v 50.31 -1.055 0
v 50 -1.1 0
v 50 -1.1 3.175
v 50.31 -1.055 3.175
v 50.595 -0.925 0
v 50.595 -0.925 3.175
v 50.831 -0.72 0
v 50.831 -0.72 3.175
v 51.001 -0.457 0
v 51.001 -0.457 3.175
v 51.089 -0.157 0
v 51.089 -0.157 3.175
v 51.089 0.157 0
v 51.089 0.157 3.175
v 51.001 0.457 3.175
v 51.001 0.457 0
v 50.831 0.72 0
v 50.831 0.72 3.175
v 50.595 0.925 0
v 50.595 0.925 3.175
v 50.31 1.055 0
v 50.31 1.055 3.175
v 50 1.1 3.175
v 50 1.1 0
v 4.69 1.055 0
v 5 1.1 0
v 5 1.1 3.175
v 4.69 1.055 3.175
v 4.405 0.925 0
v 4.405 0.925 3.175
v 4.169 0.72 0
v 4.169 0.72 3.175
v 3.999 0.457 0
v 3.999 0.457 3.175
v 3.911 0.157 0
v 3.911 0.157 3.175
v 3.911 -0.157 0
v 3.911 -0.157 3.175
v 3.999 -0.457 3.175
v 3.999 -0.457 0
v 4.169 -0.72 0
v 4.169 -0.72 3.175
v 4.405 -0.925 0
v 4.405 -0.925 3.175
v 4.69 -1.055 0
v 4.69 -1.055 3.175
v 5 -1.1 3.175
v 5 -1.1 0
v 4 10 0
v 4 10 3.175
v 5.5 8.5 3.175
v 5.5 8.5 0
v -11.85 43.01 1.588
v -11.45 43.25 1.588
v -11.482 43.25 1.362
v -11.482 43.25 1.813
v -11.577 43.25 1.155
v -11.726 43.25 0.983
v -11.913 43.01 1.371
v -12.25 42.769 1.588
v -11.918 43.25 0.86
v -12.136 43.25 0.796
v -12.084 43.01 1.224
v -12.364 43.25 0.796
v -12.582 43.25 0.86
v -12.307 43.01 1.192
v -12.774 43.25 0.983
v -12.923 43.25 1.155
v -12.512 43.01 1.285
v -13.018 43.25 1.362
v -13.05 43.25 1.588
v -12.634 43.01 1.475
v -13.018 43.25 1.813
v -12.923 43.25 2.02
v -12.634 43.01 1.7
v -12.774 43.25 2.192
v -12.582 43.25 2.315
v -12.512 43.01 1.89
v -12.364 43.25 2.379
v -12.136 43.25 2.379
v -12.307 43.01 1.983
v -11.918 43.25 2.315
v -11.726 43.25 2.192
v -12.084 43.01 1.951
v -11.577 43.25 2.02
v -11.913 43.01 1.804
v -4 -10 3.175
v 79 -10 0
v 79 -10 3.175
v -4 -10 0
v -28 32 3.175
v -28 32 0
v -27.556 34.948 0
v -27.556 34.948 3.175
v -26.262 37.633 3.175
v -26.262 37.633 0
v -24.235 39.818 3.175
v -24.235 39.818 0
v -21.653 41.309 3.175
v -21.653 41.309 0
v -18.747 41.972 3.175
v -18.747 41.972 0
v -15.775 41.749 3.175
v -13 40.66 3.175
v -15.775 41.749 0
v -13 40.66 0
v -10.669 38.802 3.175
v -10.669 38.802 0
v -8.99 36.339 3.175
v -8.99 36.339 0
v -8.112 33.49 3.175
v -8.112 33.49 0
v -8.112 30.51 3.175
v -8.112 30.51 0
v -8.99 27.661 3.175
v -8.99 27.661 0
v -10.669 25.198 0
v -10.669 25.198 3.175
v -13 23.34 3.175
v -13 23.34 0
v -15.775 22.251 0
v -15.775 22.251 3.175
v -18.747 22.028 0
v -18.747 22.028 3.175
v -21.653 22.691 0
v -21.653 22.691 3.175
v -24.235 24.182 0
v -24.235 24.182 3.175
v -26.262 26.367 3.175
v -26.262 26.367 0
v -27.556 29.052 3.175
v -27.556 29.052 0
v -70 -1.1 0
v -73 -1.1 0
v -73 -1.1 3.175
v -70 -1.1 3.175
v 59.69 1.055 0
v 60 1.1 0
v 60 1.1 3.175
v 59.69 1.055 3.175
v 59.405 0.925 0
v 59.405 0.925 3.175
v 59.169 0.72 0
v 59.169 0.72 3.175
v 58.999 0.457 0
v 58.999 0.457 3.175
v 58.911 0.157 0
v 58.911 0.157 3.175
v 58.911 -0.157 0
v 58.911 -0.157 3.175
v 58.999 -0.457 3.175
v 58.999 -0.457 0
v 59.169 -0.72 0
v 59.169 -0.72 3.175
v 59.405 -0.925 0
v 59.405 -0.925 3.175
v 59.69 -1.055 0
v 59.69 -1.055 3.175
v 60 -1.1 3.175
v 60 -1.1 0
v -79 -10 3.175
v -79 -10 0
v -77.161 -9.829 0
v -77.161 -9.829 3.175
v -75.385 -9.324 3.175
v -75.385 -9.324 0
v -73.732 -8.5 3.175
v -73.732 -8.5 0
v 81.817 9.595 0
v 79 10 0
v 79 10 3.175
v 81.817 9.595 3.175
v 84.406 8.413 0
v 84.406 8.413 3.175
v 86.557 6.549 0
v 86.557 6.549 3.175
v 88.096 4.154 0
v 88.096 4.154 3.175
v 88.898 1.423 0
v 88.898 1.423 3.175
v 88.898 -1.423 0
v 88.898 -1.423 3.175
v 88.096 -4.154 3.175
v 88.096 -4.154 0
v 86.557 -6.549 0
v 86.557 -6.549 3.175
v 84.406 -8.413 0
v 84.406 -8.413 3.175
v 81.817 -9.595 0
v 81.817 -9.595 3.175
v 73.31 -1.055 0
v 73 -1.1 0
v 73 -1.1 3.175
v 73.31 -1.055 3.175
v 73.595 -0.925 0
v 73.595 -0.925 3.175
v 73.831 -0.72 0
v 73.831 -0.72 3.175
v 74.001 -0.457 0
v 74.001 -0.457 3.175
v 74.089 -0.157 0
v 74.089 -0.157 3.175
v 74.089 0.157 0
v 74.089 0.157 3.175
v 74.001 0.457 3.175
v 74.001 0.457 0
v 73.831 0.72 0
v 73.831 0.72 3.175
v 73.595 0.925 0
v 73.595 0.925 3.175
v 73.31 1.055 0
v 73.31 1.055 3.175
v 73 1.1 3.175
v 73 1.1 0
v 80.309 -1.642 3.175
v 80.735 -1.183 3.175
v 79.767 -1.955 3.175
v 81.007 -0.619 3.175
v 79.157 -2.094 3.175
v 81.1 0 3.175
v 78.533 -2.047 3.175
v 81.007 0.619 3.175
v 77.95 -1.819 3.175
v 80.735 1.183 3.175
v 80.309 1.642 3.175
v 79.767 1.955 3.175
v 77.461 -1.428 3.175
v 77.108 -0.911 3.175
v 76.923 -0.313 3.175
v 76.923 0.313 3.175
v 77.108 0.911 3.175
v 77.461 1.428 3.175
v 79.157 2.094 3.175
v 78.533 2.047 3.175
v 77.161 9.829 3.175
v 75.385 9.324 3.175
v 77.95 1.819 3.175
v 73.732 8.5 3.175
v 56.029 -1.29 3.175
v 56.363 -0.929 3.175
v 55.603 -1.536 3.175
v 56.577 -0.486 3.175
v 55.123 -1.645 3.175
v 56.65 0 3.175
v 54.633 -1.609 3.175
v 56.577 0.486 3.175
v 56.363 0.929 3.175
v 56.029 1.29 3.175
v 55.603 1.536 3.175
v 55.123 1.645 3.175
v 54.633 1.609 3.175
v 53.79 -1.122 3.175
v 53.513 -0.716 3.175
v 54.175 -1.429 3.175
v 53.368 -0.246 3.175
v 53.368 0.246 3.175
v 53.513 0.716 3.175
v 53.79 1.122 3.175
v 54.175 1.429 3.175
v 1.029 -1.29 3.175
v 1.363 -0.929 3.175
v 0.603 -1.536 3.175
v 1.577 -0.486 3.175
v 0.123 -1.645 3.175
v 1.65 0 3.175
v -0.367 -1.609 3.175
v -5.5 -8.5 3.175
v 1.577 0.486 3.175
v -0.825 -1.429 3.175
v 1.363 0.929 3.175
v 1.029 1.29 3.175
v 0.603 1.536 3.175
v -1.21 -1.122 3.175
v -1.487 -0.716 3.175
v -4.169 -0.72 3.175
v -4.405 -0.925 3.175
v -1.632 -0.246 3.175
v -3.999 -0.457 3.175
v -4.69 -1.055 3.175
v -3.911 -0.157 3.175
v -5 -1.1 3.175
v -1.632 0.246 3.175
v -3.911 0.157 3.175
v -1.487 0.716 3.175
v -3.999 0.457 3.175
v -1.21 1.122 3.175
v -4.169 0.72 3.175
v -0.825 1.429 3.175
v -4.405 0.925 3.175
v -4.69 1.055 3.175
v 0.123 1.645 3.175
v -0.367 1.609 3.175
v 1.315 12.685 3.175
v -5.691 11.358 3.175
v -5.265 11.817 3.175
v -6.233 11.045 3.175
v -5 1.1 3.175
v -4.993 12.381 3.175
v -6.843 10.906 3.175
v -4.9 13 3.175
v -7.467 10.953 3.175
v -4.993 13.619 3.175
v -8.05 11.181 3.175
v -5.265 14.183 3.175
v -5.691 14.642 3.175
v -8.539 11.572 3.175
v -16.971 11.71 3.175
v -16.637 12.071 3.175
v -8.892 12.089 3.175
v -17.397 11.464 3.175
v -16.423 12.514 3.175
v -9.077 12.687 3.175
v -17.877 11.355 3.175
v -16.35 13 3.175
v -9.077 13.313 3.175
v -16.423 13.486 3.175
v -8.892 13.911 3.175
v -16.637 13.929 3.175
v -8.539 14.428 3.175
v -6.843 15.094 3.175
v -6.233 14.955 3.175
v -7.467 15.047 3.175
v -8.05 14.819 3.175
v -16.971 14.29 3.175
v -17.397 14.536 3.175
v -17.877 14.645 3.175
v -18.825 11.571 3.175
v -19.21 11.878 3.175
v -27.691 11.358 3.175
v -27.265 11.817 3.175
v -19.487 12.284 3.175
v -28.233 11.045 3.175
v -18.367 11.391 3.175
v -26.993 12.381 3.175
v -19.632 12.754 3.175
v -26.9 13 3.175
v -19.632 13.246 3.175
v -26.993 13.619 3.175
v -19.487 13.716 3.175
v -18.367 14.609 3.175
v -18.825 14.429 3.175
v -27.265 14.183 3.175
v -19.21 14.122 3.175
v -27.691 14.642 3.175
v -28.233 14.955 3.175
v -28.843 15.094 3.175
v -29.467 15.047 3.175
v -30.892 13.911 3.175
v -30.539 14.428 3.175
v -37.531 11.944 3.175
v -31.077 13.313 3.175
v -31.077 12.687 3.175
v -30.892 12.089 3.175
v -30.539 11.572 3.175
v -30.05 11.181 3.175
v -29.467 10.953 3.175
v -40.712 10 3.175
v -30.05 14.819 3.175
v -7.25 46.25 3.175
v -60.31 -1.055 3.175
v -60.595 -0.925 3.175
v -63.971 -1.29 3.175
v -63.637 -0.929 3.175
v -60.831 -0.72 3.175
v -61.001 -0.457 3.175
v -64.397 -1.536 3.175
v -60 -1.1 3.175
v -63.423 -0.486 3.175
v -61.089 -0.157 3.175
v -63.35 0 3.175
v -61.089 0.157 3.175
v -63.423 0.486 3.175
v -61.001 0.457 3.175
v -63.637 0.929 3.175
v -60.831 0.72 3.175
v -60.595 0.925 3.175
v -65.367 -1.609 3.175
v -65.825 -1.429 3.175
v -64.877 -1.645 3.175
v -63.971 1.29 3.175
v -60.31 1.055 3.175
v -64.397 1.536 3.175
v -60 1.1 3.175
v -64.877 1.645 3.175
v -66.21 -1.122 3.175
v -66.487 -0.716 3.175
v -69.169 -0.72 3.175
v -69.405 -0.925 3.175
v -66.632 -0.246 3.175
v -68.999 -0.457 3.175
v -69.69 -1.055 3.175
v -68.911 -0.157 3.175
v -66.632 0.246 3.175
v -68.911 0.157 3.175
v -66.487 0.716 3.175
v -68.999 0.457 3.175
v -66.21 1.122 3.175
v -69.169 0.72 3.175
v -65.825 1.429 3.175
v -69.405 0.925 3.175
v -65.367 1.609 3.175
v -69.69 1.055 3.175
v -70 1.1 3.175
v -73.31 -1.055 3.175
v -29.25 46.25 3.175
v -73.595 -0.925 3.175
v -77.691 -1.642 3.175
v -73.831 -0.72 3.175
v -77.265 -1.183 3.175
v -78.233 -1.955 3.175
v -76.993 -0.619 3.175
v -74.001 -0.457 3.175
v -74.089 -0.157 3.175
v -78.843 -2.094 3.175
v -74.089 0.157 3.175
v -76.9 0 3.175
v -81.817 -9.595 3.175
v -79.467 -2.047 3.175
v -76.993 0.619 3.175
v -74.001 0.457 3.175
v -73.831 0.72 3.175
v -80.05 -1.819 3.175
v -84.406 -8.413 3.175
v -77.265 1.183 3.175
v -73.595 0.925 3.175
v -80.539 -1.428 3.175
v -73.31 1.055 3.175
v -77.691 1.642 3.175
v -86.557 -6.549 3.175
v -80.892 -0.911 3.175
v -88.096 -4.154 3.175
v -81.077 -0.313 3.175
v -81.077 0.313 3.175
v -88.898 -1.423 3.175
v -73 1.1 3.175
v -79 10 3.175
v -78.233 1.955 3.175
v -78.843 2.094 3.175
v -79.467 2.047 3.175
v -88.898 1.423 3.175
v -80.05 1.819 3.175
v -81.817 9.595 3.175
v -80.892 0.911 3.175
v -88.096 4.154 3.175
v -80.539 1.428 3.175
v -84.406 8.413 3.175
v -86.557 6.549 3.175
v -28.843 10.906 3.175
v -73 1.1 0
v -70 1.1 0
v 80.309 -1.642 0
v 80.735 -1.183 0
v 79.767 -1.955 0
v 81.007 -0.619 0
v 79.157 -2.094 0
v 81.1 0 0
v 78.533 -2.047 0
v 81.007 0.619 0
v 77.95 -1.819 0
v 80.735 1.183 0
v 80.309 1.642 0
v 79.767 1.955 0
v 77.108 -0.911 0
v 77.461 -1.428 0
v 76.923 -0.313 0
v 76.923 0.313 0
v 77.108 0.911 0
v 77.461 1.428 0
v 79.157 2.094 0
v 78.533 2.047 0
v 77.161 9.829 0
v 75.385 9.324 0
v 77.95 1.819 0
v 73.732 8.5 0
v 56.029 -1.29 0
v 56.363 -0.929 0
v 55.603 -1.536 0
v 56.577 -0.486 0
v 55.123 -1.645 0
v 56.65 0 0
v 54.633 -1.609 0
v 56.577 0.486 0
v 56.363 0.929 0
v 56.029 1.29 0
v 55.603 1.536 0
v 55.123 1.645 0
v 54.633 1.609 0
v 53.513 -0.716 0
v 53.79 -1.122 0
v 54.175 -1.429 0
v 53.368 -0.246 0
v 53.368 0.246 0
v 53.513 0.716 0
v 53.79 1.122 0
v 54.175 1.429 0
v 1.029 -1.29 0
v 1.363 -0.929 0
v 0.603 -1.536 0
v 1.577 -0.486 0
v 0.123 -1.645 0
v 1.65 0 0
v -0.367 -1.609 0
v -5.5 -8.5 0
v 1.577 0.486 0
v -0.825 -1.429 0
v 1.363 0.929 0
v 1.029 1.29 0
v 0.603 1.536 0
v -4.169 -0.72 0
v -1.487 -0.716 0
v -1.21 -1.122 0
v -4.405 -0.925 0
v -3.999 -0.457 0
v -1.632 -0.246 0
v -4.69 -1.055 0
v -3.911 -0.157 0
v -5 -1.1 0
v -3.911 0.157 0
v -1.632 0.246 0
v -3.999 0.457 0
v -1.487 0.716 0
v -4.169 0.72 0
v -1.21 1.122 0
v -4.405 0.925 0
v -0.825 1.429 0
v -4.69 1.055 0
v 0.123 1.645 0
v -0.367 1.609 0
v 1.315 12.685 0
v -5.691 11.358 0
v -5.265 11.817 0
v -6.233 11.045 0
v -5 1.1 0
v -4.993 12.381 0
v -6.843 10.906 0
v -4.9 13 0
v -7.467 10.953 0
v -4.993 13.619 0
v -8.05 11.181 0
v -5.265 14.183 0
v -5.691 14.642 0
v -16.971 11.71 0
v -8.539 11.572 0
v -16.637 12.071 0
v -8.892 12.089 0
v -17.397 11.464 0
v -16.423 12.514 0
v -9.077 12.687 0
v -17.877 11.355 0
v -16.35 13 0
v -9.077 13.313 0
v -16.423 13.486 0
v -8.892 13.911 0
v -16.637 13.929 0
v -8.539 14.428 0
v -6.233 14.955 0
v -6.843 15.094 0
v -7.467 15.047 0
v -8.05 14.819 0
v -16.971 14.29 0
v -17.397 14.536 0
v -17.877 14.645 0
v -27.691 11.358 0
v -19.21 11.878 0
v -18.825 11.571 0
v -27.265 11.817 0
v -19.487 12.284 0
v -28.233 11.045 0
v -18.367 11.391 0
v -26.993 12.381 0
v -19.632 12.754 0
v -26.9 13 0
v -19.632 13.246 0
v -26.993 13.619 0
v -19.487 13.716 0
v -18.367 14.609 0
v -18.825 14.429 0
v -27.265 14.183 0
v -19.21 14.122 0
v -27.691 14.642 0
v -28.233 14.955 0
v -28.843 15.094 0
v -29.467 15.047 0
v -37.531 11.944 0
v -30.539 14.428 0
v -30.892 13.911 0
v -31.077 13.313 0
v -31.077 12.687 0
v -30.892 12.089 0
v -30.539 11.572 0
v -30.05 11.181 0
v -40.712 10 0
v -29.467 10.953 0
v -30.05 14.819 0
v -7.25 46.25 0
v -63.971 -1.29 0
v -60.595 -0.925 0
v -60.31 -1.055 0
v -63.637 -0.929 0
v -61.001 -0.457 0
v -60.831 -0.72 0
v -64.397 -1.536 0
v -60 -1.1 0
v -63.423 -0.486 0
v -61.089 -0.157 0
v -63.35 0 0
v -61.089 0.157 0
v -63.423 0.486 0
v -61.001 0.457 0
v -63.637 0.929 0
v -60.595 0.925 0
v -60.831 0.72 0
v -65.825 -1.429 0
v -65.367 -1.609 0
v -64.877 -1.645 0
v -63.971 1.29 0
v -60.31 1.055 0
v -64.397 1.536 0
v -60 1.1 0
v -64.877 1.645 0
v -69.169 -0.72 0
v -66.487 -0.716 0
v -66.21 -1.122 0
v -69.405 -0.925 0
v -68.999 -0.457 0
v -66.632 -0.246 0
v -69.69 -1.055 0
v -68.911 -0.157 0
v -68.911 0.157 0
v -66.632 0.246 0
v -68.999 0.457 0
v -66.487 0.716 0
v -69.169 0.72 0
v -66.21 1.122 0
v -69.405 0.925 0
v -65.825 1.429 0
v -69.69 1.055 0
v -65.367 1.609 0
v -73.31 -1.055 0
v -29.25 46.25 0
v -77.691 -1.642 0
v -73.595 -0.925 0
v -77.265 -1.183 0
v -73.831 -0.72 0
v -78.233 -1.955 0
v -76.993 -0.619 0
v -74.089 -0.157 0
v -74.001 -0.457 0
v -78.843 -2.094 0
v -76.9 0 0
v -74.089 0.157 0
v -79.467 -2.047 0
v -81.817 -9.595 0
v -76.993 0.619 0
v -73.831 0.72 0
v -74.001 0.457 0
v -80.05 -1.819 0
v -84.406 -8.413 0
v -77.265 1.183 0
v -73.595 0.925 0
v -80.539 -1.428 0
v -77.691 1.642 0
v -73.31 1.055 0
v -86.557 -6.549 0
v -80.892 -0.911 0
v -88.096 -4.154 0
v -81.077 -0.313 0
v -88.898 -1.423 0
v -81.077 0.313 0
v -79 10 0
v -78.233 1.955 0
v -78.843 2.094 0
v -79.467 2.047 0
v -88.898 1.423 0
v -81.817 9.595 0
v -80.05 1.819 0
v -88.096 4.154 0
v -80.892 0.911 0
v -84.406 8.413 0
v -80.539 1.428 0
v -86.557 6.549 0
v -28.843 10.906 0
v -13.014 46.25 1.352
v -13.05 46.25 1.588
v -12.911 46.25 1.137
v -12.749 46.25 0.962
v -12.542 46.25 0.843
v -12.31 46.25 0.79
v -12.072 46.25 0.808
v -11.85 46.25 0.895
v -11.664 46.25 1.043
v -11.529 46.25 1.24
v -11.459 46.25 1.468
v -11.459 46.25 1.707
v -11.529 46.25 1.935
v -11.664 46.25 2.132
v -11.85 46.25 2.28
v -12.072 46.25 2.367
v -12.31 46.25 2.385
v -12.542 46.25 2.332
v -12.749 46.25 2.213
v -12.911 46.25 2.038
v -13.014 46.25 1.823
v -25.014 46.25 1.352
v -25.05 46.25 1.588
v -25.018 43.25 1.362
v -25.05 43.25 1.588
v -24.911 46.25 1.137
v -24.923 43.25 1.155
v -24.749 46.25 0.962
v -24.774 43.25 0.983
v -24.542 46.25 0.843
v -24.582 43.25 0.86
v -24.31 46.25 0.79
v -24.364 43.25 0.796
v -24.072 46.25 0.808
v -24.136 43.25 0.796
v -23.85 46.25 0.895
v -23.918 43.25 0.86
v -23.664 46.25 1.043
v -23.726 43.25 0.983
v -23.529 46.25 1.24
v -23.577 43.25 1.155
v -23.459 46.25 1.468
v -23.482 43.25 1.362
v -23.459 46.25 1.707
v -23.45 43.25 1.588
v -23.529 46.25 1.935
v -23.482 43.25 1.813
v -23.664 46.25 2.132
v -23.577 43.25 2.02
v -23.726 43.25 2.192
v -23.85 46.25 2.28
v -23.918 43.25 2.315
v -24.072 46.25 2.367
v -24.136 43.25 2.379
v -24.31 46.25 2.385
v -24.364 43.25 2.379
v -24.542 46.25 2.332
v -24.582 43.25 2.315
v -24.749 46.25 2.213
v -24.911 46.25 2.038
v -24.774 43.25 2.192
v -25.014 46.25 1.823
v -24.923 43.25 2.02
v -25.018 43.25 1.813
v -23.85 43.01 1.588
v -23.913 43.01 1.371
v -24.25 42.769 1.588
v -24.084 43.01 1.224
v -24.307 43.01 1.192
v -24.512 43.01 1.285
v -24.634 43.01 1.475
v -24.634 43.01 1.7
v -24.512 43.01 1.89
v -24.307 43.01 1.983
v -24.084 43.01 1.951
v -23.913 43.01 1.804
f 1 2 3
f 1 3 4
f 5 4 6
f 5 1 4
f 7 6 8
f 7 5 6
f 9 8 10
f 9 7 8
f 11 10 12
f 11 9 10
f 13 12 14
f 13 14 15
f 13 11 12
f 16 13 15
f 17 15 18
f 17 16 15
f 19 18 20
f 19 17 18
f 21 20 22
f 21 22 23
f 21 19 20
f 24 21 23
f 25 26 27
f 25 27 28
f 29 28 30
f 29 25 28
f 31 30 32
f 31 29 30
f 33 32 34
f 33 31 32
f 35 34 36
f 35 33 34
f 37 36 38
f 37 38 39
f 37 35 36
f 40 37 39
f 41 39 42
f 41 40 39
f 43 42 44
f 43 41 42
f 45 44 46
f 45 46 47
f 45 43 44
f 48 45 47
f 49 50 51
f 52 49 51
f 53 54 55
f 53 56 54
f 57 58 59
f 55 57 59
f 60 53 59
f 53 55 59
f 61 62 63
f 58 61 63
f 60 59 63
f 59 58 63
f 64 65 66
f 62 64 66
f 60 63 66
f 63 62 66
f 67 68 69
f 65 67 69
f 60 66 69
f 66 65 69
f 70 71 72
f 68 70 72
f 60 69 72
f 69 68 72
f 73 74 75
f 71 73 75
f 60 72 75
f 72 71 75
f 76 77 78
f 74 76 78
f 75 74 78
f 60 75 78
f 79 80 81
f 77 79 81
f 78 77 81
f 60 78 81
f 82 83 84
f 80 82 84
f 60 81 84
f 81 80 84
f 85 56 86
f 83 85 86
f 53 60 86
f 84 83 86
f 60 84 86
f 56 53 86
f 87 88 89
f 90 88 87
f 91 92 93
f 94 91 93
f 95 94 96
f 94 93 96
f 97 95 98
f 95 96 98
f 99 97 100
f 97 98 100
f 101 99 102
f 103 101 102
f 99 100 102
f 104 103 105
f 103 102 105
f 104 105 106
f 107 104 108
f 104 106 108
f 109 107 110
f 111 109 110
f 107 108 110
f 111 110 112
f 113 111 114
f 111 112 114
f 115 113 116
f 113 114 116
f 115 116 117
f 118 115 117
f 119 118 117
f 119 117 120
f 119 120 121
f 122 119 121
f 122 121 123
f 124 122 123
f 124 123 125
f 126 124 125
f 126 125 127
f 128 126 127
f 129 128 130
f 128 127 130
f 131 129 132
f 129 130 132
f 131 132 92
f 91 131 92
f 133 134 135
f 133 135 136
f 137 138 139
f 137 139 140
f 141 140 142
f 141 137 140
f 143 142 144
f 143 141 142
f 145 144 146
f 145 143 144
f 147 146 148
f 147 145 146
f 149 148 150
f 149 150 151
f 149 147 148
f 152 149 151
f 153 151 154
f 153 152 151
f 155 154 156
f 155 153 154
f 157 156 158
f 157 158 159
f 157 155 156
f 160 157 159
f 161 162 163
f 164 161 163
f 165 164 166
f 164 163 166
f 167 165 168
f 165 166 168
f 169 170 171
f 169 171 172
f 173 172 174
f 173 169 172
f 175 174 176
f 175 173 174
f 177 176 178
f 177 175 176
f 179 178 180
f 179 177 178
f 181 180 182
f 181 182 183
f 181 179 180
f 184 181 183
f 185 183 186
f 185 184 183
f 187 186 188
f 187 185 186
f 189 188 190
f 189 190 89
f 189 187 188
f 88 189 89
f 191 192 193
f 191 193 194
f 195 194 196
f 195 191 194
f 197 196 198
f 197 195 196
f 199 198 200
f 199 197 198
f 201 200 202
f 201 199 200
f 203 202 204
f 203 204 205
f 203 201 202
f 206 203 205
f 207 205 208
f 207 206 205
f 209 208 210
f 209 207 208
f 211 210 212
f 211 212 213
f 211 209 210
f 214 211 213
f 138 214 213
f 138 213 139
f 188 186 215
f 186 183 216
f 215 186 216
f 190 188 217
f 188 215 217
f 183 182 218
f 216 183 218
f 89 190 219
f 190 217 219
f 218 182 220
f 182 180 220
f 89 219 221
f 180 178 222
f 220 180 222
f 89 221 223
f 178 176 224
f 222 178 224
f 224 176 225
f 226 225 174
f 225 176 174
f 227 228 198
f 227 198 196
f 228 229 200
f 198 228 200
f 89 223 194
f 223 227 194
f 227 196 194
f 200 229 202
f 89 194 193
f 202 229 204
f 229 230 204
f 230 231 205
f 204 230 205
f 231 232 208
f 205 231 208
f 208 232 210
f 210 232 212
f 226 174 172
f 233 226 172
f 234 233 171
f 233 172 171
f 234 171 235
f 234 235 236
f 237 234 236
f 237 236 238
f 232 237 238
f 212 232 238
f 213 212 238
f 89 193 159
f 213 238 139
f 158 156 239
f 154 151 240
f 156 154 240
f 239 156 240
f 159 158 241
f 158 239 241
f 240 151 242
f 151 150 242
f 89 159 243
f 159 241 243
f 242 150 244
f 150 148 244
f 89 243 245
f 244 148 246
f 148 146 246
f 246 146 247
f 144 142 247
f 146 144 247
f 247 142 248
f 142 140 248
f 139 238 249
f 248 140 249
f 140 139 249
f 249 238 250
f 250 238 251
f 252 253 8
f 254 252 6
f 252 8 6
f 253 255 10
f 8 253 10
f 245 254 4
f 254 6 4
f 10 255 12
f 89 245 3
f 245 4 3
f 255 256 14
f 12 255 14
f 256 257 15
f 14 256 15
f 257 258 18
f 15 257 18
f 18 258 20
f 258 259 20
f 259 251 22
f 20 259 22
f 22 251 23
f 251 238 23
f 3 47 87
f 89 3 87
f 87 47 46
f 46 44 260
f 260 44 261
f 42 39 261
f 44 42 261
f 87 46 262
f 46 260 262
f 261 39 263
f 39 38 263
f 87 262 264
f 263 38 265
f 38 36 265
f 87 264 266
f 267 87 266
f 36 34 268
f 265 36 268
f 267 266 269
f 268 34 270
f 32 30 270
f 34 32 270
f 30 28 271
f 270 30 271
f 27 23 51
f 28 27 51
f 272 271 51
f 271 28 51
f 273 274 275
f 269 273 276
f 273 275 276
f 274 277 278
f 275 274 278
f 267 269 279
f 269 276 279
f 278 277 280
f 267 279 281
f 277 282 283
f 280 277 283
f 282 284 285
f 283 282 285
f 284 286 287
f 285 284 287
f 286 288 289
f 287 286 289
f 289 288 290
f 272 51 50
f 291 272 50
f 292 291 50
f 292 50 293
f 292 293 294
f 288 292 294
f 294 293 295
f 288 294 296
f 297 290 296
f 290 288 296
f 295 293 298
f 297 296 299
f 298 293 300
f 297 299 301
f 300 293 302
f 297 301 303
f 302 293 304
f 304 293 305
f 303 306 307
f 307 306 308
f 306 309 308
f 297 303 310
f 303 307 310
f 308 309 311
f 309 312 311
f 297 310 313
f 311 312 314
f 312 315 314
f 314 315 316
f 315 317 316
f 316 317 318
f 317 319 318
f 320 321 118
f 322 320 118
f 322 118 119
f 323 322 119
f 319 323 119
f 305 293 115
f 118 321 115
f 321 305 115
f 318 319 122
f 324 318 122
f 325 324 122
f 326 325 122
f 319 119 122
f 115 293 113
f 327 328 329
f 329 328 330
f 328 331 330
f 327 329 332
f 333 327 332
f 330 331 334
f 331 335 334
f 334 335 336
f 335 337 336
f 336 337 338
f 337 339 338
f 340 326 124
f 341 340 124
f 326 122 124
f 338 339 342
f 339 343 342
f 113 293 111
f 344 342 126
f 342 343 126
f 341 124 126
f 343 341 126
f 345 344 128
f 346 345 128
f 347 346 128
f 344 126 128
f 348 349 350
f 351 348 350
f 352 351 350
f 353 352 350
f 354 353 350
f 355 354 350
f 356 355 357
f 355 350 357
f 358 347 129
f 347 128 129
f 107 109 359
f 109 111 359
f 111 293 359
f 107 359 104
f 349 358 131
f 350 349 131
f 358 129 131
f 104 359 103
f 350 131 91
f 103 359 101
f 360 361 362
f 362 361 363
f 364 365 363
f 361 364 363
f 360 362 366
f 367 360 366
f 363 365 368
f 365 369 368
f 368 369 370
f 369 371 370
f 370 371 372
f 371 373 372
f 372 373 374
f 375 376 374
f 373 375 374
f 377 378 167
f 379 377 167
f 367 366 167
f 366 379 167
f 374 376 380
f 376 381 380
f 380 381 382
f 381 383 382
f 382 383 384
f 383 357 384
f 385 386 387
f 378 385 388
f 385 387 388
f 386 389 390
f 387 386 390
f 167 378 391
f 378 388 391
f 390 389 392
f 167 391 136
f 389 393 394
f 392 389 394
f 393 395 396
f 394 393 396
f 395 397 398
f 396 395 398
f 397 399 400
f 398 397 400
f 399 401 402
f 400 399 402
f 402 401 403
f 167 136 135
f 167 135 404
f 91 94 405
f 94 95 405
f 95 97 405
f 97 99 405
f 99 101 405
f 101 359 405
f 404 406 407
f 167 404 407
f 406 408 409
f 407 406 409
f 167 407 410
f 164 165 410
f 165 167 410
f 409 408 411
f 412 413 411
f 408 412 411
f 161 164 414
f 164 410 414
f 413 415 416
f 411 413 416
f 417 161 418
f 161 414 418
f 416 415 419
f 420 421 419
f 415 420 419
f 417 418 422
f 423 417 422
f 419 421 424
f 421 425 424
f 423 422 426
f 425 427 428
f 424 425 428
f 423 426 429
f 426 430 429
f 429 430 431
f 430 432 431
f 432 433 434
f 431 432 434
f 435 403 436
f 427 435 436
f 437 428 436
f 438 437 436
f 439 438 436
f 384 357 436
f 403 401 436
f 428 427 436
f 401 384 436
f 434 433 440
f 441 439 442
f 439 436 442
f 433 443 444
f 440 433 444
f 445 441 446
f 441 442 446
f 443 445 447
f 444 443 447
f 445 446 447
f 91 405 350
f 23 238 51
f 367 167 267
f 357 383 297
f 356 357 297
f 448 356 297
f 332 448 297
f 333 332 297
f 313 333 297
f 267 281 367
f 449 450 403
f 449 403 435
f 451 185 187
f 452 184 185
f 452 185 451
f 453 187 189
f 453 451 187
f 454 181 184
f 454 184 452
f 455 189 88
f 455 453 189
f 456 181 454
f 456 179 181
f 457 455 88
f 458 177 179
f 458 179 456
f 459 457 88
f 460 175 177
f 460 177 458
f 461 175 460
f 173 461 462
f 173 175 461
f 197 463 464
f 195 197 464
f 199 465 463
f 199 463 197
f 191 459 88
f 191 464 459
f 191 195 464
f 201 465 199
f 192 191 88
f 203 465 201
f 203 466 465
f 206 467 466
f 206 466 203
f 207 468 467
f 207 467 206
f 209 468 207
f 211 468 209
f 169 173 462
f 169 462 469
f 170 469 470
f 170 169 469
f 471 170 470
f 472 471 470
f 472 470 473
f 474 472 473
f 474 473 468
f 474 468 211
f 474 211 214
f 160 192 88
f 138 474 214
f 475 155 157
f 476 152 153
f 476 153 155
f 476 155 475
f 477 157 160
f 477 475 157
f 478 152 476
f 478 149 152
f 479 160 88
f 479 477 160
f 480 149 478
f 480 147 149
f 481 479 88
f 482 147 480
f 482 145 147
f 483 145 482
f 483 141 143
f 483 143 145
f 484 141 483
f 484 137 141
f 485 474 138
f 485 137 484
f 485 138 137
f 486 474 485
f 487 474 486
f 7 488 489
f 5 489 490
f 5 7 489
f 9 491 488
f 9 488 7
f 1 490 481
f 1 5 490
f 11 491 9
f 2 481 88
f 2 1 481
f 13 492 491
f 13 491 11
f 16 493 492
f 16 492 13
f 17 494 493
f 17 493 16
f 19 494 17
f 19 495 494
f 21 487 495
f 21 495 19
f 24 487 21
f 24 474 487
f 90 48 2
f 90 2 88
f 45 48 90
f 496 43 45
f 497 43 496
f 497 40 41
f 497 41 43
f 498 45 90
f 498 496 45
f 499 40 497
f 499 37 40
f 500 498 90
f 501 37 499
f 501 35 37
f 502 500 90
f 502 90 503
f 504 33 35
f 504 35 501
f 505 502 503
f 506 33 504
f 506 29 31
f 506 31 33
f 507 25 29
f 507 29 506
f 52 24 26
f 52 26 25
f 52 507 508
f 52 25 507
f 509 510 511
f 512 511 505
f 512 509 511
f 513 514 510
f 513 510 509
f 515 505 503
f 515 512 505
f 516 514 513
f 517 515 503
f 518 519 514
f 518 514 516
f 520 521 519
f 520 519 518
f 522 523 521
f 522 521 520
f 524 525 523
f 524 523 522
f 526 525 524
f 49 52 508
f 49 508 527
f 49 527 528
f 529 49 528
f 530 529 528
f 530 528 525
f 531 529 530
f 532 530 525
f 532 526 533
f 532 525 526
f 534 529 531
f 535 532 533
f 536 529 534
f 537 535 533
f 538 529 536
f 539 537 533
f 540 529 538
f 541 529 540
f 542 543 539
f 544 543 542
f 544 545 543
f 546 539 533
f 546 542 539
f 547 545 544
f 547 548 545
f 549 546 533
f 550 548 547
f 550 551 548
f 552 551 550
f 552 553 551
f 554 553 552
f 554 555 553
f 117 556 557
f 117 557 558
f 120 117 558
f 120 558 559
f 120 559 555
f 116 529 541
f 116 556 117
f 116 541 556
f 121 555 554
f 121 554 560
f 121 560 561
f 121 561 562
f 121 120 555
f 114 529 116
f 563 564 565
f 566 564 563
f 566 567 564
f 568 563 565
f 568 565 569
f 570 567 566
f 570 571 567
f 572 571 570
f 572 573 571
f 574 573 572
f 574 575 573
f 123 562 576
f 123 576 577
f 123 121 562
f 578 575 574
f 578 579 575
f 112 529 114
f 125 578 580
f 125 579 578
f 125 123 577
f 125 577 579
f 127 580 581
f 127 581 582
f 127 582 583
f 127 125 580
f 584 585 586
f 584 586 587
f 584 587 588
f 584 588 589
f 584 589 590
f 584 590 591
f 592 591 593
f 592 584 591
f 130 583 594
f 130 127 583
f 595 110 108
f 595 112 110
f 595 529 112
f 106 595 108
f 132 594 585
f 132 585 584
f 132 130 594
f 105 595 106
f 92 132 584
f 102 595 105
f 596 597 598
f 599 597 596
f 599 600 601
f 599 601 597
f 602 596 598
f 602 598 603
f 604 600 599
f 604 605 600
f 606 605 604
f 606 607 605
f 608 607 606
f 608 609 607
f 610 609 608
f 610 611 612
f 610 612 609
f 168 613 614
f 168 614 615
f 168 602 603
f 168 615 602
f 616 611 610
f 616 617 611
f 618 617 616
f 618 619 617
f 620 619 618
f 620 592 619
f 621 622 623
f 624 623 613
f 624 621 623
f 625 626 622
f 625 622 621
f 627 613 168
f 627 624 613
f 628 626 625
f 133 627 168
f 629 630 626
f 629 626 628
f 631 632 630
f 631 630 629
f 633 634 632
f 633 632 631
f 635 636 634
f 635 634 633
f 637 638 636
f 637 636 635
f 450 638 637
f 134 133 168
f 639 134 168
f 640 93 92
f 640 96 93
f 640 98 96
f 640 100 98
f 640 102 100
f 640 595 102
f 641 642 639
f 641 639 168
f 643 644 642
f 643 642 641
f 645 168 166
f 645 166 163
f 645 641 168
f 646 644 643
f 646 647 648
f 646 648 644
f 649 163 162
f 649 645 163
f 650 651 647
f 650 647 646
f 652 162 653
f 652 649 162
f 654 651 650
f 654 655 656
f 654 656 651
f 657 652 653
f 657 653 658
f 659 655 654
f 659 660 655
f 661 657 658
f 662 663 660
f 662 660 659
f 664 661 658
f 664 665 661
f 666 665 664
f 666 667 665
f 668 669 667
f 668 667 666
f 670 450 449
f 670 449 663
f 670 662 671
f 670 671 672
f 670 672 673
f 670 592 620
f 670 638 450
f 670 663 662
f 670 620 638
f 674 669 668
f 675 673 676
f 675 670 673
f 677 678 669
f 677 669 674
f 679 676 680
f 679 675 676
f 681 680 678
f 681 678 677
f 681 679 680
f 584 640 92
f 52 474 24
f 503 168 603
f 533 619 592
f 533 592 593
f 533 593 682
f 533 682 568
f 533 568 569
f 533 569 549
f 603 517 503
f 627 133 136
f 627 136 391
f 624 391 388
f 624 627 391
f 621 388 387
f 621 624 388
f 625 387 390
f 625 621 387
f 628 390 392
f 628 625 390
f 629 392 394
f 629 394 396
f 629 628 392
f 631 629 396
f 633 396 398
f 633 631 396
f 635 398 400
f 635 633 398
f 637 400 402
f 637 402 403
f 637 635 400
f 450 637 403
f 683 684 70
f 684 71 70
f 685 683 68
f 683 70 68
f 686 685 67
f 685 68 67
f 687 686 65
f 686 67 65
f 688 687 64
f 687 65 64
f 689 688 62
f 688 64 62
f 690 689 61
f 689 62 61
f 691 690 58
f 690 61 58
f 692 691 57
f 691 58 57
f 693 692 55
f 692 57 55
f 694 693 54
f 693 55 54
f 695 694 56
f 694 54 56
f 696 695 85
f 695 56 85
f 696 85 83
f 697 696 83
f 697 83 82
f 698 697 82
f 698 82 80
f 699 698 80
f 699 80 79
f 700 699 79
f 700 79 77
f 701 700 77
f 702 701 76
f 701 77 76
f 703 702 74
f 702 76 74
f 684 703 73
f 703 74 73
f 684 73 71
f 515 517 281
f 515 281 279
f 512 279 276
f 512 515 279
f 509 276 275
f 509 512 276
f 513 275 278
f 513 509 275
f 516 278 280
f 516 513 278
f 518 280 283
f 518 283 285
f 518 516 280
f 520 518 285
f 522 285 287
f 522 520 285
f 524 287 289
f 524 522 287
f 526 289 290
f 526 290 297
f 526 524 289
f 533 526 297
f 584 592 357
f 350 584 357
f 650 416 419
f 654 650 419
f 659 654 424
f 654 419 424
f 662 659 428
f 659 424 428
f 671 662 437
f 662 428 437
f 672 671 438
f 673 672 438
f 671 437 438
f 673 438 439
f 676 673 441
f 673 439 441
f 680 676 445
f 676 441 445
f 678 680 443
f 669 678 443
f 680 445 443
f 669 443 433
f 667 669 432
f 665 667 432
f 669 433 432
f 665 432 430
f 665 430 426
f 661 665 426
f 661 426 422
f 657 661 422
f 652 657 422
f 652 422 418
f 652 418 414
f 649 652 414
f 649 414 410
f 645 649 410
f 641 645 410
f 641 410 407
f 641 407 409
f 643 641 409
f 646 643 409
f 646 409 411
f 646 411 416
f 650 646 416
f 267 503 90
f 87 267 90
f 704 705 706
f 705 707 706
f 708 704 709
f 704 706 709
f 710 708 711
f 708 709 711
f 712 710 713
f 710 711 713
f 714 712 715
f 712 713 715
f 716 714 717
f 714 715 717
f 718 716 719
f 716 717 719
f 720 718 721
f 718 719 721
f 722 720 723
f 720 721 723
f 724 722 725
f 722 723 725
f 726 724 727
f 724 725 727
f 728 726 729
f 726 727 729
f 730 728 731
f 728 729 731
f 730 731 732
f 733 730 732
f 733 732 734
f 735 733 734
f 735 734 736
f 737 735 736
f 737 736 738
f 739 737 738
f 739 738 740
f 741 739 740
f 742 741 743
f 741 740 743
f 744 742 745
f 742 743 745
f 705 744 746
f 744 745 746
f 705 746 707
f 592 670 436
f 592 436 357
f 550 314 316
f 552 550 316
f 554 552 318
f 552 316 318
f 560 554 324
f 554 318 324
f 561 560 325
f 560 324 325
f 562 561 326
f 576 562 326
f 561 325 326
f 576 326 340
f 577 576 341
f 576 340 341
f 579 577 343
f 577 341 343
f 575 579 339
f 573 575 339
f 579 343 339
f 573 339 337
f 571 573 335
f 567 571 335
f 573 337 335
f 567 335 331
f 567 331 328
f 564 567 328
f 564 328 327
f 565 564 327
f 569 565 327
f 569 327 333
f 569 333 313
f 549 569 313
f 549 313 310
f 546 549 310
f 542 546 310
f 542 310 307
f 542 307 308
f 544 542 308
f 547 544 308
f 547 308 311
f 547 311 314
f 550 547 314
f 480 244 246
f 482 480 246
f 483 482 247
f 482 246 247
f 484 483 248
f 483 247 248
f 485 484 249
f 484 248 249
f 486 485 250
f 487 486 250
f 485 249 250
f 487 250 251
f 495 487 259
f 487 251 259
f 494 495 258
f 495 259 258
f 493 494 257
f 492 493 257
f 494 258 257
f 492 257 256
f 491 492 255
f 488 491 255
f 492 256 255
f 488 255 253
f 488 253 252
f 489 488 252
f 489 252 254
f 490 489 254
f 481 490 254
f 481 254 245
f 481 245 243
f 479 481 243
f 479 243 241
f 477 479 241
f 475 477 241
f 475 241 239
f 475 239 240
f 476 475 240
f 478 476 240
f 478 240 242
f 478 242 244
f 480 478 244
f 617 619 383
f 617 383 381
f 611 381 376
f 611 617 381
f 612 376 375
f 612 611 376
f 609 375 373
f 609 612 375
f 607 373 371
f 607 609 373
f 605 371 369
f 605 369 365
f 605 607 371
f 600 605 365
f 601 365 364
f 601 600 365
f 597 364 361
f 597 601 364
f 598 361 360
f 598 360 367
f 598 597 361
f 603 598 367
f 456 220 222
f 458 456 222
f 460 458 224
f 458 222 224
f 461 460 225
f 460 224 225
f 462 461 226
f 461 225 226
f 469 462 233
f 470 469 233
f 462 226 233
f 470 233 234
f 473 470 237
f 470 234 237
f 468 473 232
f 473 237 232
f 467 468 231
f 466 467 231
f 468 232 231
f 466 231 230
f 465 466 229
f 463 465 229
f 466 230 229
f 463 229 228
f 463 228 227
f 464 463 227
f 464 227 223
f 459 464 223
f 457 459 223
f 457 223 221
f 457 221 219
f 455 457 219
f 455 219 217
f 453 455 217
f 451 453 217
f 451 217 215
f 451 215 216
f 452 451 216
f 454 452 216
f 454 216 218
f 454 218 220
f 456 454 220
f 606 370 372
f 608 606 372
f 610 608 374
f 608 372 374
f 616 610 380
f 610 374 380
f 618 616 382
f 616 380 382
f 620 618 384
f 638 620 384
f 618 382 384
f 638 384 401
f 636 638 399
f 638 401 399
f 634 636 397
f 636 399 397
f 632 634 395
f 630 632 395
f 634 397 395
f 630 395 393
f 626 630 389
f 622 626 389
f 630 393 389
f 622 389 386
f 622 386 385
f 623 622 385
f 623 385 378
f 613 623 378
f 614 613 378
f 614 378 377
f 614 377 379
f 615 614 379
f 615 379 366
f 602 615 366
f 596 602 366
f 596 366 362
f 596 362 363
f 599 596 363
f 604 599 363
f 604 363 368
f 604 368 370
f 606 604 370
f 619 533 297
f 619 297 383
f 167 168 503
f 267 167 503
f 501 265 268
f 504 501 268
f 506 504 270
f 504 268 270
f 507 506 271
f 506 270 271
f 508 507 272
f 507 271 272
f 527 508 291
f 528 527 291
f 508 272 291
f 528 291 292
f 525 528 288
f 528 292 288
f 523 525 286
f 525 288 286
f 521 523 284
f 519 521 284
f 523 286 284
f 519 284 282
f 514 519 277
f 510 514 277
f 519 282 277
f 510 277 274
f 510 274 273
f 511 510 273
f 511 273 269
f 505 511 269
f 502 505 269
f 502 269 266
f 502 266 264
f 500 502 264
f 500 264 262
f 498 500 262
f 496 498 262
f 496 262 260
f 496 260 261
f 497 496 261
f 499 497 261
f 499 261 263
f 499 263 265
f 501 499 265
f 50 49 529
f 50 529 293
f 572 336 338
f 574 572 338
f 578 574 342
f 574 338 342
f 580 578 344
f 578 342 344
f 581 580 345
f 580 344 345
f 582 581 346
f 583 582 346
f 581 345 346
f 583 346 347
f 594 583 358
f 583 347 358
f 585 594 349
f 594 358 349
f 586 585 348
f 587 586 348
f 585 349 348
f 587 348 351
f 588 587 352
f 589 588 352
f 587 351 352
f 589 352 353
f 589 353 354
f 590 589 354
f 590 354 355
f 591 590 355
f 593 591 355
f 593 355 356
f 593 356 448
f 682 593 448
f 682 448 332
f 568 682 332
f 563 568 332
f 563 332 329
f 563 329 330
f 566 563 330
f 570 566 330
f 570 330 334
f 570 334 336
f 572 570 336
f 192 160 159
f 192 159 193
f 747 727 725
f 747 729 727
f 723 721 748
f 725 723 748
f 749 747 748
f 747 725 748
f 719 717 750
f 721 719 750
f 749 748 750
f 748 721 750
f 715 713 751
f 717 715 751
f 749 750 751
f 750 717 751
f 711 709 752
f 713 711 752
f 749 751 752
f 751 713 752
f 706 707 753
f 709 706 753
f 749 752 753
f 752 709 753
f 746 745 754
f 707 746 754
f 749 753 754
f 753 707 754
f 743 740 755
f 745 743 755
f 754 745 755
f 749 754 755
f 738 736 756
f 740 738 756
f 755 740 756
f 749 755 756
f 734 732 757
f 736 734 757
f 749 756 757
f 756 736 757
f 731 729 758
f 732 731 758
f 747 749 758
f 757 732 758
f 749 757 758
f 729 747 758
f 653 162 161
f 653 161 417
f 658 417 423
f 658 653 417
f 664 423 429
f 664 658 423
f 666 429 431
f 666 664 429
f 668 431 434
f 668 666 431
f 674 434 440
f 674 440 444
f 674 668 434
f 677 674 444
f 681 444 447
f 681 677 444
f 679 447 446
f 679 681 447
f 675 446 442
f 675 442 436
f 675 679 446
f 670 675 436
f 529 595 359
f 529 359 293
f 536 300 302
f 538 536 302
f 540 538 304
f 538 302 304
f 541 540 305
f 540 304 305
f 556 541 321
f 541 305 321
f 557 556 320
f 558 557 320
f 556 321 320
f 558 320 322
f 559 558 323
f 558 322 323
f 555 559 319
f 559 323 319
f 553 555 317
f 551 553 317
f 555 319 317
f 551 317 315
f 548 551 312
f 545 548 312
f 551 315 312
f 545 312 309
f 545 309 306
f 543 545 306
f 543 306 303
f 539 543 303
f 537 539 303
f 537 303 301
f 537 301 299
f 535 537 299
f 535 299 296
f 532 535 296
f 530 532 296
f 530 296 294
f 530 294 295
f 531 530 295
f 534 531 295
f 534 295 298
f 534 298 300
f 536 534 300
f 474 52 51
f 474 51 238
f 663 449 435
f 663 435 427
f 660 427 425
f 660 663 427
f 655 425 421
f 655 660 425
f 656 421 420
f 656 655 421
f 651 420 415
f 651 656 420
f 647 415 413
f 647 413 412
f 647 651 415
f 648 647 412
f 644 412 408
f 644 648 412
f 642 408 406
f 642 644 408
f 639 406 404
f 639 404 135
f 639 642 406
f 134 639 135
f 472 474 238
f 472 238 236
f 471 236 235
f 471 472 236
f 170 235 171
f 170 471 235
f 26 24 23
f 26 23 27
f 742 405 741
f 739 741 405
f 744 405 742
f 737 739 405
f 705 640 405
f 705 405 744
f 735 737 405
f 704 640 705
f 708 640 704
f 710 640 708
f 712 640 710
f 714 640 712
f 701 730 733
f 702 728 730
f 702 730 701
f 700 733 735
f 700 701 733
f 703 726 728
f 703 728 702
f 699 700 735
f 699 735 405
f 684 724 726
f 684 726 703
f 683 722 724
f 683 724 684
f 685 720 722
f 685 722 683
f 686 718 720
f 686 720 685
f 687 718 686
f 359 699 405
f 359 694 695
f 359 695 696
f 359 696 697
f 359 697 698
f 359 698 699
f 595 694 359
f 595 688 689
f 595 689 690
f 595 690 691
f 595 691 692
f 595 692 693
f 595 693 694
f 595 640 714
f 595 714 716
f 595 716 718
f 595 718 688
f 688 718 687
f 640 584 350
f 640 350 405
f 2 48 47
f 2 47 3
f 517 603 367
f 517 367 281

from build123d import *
from OCP.BRepFilletAPI import BRepFilletAPI_MakeChamfer

# Parameters (mm, degrees)
BOSS_EXTRUDE1_DEPTH             = 3.175
TAP_DRILL_FOR_M5X0_8_TAP1_D     = 4.2
BOSS_EXTRUDE2_DEPTH             = 3.175
TAP_DRILL_FOR_M5X0_8_TAP2_D     = 4.2
SKETCH11_R                      = 10
CUT_EXTRUDE3_DEPTH              = 3.175
TAP_DRILL_FOR_M4X0_7_TAP1_D     = 3.3
CUT_EXTRUDE5_DEPTH              = 3.175
CHAMFER1_SIZE                   = 2
CHAMFER1_SIZE2                  = 2.712078889
CHAMFER1_SIZE2_2                = 2.771226843
CUT_EXTRUDE6_START              = -9
CUT_EXTRUDE6_DEPTH              = 9
TAP_DRILL_FOR_M2X0_4_TAP1_D     = 1.6
TAP_DRILL_FOR_M2X0_4_TAP1_DEPTH = 3
TAP_DRILL_FOR_M2X0_4_TAP1_TIP   = 0.480688495


with BuildPart() as part:
    # Sketch1 → Boss-Extrude1 (new body)
    with BuildSketch(Plane.XY):
        with BuildLine():
            Line((-79, 10), (79, 10))
            ThreePointArc((79, 10), (89, 0), (79, -10))
            Line((79, -10), (-79, -10))
            ThreePointArc((-79, -10), (-89, 0), (-79, 10))
        make_face()
    extrude(amount=BOSS_EXTRUDE1_DEPTH)

    # Tap Drill for M5x0.8 Tap1 (through all)
    with Locations(Plane(origin=(0, 0, 0), x_dir=(-1, 0, 0), z_dir=(0, 0, -1))):
        with Locations((-79, 0), (79, 0)):
            Hole(TAP_DRILL_FOR_M5X0_8_TAP1_D / 2)

    # Sketch8 → Boss-Extrude2 (add)
    with BuildSketch(Plane(origin=(0, 0, 0), x_dir=(-1, 0, 0), z_dir=(0, 0, -1))):
        Polygon((29.25, 46.25), (7.25, 46.25), (-2, 10), (38, 10), align=None)
    extrude(amount=-BOSS_EXTRUDE2_DEPTH)

    # Tap Drill for M5x0.8 Tap2 (through all)
    with Locations(Plane(origin=(0, 0, 0), x_dir=(-1, 0, 0), z_dir=(0, 0, -1))):
        with Locations((7, 13), (29, 13)):
            Hole(TAP_DRILL_FOR_M5X0_8_TAP2_D / 2)

    # Sketch11 → Cut-Extrude3 (cut)
    with BuildSketch(Plane(origin=(0, 0, 0), x_dir=(-1, 0, 0), z_dir=(0, 0, -1))):
        with Locations((18, 32)):
            Circle(SKETCH11_R)
    extrude(amount=-CUT_EXTRUDE3_DEPTH, mode=Mode.SUBTRACT)

    # Tap Drill for M4x0.7 Tap1 (through all)
    with Locations(Plane(origin=(0, 0, 0), x_dir=(-1, 0, 0), z_dir=(0, 0, -1))):
        with Locations((0, 0), (-55, 0), (18, 13), (65, 0)):
            Hole(TAP_DRILL_FOR_M4X0_7_TAP1_D / 2)

    # Sketch17 → Cut-Extrude5 (cut)
    with BuildSketch(Plane(origin=(0, 0, 0), x_dir=(-1, 0, 0), z_dir=(0, 0, -1))):
        with BuildLine():
            Line((-73, 1.1), (-60, 1.1))
            ThreePointArc((-60, 1.1), (-58.9, 0), (-60, -1.1))
            Line((-60, -1.1), (-73, -1.1))
            ThreePointArc((-73, -1.1), (-74.1, 0), (-73, 1.1))
        make_face()
        with BuildLine():
            Line((-50, 1.1), (-5, 1.1))
            ThreePointArc((-5, 1.1), (-3.9, 0), (-5, -1.1))
            Line((-5, -1.1), (-50, -1.1))
            ThreePointArc((-50, -1.1), (-51.1, 0), (-50, 1.1))
        make_face()
        with BuildLine():
            Line((5, 1.1), (60, 1.1))
            ThreePointArc((60, 1.1), (61.1, 0), (60, -1.1))
            Line((60, -1.1), (5, -1.1))
            ThreePointArc((5, -1.1), (3.9, 0), (5, 1.1))
        make_face()
        with BuildLine():
            Line((70, 1.1), (73, 1.1))
            ThreePointArc((73, 1.1), (74.1, 0), (73, -1.1))
            Line((73, -1.1), (70, -1.1))
            ThreePointArc((70, -1.1), (68.9, 0), (70, 1.1))
        make_face()
    extrude(amount=-CUT_EXTRUDE5_DEPTH, mode=Mode.SUBTRACT)

    # Chamfer1: one chamfer whose edges measure the first distance from different faces: ONE call of the kernel's chamfer builder (chamfer() names one face for all edges)
    chamfer1_edges_1 = [part.edges().sort_by_distance(p)[0] for p in [
        (-38, 10, 1.5875),
    ]]
    chamfer1_side_1 = [part.faces().sort_by_distance(p)[0] for p in [
        (-33.625, 28.125, 1.5875),
    ]]
    chamfer1_edges_2 = [part.edges().sort_by_distance(p)[0] for p in [
        (2, 10, 1.5875),
    ]]
    chamfer1_side_2 = [part.faces().sort_by_distance(p)[0] for p in [
        (40.5, 10, 1.5875),
    ]]
    chamfer1 = BRepFilletAPI_MakeChamfer(part.part.solid().wrapped)
    for e in chamfer1_edges_1:
        chamfer1.Add(CHAMFER1_SIZE, CHAMFER1_SIZE2, e.wrapped, chamfer1_side_1[0].wrapped)  # the first distance lies on this face
    for e in chamfer1_edges_2:
        chamfer1.Add(CHAMFER1_SIZE, CHAMFER1_SIZE2_2, e.wrapped, chamfer1_side_2[0].wrapped)  # the first distance lies on this face
    add(Compound.cast(chamfer1.Shape()), mode=Mode.REPLACE)

    # Sketch18 → Cut-Extrude6 (cut)
    with BuildSketch(Plane.XY.offset(3.175).offset(CUT_EXTRUDE6_START)):
        with BuildLine():
            Line((4, 10), (5.5, 8.5))
            Line((5.5, 8.5), (73.732173124, 8.5))
            ThreePointArc((73.732173124, 8.5), (76.261387212, 9.617692031), (79, 10))
            Line((79, 10), (4, 10))
        make_face()
        with BuildLine():
            Line((-4, -10), (-79, -10))
            ThreePointArc((-79, -10), (-76.261387212, -9.617692031), (-73.732173124, -8.5))
            Line((-73.732173124, -8.5), (-5.5, -8.5))
            Line((-5.5, -8.5), (-4, -10))
        make_face()
    extrude(amount=CUT_EXTRUDE6_DEPTH, mode=Mode.SUBTRACT)

    # Tap Drill for M2x0.4 Tap1
    with Locations(Plane(origin=(0, 46.25, 0), x_dir=(1, 0, 0), z_dir=(0, 1, 0))):
        with Locations((-24.25, -1.5875), (-12.25, -1.5875)):
            Hole(TAP_DRILL_FOR_M2X0_4_TAP1_D / 2, depth=TAP_DRILL_FOR_M2X0_4_TAP1_DEPTH)
            with Locations((0, 0, -(TAP_DRILL_FOR_M2X0_4_TAP1_DEPTH + TAP_DRILL_FOR_M2X0_4_TAP1_TIP / 2))):  # 118° drill point
                Cone(0, TAP_DRILL_FOR_M2X0_4_TAP1_D / 2, TAP_DRILL_FOR_M2X0_4_TAP1_TIP, mode=Mode.SUBTRACT)


solid = part.part
